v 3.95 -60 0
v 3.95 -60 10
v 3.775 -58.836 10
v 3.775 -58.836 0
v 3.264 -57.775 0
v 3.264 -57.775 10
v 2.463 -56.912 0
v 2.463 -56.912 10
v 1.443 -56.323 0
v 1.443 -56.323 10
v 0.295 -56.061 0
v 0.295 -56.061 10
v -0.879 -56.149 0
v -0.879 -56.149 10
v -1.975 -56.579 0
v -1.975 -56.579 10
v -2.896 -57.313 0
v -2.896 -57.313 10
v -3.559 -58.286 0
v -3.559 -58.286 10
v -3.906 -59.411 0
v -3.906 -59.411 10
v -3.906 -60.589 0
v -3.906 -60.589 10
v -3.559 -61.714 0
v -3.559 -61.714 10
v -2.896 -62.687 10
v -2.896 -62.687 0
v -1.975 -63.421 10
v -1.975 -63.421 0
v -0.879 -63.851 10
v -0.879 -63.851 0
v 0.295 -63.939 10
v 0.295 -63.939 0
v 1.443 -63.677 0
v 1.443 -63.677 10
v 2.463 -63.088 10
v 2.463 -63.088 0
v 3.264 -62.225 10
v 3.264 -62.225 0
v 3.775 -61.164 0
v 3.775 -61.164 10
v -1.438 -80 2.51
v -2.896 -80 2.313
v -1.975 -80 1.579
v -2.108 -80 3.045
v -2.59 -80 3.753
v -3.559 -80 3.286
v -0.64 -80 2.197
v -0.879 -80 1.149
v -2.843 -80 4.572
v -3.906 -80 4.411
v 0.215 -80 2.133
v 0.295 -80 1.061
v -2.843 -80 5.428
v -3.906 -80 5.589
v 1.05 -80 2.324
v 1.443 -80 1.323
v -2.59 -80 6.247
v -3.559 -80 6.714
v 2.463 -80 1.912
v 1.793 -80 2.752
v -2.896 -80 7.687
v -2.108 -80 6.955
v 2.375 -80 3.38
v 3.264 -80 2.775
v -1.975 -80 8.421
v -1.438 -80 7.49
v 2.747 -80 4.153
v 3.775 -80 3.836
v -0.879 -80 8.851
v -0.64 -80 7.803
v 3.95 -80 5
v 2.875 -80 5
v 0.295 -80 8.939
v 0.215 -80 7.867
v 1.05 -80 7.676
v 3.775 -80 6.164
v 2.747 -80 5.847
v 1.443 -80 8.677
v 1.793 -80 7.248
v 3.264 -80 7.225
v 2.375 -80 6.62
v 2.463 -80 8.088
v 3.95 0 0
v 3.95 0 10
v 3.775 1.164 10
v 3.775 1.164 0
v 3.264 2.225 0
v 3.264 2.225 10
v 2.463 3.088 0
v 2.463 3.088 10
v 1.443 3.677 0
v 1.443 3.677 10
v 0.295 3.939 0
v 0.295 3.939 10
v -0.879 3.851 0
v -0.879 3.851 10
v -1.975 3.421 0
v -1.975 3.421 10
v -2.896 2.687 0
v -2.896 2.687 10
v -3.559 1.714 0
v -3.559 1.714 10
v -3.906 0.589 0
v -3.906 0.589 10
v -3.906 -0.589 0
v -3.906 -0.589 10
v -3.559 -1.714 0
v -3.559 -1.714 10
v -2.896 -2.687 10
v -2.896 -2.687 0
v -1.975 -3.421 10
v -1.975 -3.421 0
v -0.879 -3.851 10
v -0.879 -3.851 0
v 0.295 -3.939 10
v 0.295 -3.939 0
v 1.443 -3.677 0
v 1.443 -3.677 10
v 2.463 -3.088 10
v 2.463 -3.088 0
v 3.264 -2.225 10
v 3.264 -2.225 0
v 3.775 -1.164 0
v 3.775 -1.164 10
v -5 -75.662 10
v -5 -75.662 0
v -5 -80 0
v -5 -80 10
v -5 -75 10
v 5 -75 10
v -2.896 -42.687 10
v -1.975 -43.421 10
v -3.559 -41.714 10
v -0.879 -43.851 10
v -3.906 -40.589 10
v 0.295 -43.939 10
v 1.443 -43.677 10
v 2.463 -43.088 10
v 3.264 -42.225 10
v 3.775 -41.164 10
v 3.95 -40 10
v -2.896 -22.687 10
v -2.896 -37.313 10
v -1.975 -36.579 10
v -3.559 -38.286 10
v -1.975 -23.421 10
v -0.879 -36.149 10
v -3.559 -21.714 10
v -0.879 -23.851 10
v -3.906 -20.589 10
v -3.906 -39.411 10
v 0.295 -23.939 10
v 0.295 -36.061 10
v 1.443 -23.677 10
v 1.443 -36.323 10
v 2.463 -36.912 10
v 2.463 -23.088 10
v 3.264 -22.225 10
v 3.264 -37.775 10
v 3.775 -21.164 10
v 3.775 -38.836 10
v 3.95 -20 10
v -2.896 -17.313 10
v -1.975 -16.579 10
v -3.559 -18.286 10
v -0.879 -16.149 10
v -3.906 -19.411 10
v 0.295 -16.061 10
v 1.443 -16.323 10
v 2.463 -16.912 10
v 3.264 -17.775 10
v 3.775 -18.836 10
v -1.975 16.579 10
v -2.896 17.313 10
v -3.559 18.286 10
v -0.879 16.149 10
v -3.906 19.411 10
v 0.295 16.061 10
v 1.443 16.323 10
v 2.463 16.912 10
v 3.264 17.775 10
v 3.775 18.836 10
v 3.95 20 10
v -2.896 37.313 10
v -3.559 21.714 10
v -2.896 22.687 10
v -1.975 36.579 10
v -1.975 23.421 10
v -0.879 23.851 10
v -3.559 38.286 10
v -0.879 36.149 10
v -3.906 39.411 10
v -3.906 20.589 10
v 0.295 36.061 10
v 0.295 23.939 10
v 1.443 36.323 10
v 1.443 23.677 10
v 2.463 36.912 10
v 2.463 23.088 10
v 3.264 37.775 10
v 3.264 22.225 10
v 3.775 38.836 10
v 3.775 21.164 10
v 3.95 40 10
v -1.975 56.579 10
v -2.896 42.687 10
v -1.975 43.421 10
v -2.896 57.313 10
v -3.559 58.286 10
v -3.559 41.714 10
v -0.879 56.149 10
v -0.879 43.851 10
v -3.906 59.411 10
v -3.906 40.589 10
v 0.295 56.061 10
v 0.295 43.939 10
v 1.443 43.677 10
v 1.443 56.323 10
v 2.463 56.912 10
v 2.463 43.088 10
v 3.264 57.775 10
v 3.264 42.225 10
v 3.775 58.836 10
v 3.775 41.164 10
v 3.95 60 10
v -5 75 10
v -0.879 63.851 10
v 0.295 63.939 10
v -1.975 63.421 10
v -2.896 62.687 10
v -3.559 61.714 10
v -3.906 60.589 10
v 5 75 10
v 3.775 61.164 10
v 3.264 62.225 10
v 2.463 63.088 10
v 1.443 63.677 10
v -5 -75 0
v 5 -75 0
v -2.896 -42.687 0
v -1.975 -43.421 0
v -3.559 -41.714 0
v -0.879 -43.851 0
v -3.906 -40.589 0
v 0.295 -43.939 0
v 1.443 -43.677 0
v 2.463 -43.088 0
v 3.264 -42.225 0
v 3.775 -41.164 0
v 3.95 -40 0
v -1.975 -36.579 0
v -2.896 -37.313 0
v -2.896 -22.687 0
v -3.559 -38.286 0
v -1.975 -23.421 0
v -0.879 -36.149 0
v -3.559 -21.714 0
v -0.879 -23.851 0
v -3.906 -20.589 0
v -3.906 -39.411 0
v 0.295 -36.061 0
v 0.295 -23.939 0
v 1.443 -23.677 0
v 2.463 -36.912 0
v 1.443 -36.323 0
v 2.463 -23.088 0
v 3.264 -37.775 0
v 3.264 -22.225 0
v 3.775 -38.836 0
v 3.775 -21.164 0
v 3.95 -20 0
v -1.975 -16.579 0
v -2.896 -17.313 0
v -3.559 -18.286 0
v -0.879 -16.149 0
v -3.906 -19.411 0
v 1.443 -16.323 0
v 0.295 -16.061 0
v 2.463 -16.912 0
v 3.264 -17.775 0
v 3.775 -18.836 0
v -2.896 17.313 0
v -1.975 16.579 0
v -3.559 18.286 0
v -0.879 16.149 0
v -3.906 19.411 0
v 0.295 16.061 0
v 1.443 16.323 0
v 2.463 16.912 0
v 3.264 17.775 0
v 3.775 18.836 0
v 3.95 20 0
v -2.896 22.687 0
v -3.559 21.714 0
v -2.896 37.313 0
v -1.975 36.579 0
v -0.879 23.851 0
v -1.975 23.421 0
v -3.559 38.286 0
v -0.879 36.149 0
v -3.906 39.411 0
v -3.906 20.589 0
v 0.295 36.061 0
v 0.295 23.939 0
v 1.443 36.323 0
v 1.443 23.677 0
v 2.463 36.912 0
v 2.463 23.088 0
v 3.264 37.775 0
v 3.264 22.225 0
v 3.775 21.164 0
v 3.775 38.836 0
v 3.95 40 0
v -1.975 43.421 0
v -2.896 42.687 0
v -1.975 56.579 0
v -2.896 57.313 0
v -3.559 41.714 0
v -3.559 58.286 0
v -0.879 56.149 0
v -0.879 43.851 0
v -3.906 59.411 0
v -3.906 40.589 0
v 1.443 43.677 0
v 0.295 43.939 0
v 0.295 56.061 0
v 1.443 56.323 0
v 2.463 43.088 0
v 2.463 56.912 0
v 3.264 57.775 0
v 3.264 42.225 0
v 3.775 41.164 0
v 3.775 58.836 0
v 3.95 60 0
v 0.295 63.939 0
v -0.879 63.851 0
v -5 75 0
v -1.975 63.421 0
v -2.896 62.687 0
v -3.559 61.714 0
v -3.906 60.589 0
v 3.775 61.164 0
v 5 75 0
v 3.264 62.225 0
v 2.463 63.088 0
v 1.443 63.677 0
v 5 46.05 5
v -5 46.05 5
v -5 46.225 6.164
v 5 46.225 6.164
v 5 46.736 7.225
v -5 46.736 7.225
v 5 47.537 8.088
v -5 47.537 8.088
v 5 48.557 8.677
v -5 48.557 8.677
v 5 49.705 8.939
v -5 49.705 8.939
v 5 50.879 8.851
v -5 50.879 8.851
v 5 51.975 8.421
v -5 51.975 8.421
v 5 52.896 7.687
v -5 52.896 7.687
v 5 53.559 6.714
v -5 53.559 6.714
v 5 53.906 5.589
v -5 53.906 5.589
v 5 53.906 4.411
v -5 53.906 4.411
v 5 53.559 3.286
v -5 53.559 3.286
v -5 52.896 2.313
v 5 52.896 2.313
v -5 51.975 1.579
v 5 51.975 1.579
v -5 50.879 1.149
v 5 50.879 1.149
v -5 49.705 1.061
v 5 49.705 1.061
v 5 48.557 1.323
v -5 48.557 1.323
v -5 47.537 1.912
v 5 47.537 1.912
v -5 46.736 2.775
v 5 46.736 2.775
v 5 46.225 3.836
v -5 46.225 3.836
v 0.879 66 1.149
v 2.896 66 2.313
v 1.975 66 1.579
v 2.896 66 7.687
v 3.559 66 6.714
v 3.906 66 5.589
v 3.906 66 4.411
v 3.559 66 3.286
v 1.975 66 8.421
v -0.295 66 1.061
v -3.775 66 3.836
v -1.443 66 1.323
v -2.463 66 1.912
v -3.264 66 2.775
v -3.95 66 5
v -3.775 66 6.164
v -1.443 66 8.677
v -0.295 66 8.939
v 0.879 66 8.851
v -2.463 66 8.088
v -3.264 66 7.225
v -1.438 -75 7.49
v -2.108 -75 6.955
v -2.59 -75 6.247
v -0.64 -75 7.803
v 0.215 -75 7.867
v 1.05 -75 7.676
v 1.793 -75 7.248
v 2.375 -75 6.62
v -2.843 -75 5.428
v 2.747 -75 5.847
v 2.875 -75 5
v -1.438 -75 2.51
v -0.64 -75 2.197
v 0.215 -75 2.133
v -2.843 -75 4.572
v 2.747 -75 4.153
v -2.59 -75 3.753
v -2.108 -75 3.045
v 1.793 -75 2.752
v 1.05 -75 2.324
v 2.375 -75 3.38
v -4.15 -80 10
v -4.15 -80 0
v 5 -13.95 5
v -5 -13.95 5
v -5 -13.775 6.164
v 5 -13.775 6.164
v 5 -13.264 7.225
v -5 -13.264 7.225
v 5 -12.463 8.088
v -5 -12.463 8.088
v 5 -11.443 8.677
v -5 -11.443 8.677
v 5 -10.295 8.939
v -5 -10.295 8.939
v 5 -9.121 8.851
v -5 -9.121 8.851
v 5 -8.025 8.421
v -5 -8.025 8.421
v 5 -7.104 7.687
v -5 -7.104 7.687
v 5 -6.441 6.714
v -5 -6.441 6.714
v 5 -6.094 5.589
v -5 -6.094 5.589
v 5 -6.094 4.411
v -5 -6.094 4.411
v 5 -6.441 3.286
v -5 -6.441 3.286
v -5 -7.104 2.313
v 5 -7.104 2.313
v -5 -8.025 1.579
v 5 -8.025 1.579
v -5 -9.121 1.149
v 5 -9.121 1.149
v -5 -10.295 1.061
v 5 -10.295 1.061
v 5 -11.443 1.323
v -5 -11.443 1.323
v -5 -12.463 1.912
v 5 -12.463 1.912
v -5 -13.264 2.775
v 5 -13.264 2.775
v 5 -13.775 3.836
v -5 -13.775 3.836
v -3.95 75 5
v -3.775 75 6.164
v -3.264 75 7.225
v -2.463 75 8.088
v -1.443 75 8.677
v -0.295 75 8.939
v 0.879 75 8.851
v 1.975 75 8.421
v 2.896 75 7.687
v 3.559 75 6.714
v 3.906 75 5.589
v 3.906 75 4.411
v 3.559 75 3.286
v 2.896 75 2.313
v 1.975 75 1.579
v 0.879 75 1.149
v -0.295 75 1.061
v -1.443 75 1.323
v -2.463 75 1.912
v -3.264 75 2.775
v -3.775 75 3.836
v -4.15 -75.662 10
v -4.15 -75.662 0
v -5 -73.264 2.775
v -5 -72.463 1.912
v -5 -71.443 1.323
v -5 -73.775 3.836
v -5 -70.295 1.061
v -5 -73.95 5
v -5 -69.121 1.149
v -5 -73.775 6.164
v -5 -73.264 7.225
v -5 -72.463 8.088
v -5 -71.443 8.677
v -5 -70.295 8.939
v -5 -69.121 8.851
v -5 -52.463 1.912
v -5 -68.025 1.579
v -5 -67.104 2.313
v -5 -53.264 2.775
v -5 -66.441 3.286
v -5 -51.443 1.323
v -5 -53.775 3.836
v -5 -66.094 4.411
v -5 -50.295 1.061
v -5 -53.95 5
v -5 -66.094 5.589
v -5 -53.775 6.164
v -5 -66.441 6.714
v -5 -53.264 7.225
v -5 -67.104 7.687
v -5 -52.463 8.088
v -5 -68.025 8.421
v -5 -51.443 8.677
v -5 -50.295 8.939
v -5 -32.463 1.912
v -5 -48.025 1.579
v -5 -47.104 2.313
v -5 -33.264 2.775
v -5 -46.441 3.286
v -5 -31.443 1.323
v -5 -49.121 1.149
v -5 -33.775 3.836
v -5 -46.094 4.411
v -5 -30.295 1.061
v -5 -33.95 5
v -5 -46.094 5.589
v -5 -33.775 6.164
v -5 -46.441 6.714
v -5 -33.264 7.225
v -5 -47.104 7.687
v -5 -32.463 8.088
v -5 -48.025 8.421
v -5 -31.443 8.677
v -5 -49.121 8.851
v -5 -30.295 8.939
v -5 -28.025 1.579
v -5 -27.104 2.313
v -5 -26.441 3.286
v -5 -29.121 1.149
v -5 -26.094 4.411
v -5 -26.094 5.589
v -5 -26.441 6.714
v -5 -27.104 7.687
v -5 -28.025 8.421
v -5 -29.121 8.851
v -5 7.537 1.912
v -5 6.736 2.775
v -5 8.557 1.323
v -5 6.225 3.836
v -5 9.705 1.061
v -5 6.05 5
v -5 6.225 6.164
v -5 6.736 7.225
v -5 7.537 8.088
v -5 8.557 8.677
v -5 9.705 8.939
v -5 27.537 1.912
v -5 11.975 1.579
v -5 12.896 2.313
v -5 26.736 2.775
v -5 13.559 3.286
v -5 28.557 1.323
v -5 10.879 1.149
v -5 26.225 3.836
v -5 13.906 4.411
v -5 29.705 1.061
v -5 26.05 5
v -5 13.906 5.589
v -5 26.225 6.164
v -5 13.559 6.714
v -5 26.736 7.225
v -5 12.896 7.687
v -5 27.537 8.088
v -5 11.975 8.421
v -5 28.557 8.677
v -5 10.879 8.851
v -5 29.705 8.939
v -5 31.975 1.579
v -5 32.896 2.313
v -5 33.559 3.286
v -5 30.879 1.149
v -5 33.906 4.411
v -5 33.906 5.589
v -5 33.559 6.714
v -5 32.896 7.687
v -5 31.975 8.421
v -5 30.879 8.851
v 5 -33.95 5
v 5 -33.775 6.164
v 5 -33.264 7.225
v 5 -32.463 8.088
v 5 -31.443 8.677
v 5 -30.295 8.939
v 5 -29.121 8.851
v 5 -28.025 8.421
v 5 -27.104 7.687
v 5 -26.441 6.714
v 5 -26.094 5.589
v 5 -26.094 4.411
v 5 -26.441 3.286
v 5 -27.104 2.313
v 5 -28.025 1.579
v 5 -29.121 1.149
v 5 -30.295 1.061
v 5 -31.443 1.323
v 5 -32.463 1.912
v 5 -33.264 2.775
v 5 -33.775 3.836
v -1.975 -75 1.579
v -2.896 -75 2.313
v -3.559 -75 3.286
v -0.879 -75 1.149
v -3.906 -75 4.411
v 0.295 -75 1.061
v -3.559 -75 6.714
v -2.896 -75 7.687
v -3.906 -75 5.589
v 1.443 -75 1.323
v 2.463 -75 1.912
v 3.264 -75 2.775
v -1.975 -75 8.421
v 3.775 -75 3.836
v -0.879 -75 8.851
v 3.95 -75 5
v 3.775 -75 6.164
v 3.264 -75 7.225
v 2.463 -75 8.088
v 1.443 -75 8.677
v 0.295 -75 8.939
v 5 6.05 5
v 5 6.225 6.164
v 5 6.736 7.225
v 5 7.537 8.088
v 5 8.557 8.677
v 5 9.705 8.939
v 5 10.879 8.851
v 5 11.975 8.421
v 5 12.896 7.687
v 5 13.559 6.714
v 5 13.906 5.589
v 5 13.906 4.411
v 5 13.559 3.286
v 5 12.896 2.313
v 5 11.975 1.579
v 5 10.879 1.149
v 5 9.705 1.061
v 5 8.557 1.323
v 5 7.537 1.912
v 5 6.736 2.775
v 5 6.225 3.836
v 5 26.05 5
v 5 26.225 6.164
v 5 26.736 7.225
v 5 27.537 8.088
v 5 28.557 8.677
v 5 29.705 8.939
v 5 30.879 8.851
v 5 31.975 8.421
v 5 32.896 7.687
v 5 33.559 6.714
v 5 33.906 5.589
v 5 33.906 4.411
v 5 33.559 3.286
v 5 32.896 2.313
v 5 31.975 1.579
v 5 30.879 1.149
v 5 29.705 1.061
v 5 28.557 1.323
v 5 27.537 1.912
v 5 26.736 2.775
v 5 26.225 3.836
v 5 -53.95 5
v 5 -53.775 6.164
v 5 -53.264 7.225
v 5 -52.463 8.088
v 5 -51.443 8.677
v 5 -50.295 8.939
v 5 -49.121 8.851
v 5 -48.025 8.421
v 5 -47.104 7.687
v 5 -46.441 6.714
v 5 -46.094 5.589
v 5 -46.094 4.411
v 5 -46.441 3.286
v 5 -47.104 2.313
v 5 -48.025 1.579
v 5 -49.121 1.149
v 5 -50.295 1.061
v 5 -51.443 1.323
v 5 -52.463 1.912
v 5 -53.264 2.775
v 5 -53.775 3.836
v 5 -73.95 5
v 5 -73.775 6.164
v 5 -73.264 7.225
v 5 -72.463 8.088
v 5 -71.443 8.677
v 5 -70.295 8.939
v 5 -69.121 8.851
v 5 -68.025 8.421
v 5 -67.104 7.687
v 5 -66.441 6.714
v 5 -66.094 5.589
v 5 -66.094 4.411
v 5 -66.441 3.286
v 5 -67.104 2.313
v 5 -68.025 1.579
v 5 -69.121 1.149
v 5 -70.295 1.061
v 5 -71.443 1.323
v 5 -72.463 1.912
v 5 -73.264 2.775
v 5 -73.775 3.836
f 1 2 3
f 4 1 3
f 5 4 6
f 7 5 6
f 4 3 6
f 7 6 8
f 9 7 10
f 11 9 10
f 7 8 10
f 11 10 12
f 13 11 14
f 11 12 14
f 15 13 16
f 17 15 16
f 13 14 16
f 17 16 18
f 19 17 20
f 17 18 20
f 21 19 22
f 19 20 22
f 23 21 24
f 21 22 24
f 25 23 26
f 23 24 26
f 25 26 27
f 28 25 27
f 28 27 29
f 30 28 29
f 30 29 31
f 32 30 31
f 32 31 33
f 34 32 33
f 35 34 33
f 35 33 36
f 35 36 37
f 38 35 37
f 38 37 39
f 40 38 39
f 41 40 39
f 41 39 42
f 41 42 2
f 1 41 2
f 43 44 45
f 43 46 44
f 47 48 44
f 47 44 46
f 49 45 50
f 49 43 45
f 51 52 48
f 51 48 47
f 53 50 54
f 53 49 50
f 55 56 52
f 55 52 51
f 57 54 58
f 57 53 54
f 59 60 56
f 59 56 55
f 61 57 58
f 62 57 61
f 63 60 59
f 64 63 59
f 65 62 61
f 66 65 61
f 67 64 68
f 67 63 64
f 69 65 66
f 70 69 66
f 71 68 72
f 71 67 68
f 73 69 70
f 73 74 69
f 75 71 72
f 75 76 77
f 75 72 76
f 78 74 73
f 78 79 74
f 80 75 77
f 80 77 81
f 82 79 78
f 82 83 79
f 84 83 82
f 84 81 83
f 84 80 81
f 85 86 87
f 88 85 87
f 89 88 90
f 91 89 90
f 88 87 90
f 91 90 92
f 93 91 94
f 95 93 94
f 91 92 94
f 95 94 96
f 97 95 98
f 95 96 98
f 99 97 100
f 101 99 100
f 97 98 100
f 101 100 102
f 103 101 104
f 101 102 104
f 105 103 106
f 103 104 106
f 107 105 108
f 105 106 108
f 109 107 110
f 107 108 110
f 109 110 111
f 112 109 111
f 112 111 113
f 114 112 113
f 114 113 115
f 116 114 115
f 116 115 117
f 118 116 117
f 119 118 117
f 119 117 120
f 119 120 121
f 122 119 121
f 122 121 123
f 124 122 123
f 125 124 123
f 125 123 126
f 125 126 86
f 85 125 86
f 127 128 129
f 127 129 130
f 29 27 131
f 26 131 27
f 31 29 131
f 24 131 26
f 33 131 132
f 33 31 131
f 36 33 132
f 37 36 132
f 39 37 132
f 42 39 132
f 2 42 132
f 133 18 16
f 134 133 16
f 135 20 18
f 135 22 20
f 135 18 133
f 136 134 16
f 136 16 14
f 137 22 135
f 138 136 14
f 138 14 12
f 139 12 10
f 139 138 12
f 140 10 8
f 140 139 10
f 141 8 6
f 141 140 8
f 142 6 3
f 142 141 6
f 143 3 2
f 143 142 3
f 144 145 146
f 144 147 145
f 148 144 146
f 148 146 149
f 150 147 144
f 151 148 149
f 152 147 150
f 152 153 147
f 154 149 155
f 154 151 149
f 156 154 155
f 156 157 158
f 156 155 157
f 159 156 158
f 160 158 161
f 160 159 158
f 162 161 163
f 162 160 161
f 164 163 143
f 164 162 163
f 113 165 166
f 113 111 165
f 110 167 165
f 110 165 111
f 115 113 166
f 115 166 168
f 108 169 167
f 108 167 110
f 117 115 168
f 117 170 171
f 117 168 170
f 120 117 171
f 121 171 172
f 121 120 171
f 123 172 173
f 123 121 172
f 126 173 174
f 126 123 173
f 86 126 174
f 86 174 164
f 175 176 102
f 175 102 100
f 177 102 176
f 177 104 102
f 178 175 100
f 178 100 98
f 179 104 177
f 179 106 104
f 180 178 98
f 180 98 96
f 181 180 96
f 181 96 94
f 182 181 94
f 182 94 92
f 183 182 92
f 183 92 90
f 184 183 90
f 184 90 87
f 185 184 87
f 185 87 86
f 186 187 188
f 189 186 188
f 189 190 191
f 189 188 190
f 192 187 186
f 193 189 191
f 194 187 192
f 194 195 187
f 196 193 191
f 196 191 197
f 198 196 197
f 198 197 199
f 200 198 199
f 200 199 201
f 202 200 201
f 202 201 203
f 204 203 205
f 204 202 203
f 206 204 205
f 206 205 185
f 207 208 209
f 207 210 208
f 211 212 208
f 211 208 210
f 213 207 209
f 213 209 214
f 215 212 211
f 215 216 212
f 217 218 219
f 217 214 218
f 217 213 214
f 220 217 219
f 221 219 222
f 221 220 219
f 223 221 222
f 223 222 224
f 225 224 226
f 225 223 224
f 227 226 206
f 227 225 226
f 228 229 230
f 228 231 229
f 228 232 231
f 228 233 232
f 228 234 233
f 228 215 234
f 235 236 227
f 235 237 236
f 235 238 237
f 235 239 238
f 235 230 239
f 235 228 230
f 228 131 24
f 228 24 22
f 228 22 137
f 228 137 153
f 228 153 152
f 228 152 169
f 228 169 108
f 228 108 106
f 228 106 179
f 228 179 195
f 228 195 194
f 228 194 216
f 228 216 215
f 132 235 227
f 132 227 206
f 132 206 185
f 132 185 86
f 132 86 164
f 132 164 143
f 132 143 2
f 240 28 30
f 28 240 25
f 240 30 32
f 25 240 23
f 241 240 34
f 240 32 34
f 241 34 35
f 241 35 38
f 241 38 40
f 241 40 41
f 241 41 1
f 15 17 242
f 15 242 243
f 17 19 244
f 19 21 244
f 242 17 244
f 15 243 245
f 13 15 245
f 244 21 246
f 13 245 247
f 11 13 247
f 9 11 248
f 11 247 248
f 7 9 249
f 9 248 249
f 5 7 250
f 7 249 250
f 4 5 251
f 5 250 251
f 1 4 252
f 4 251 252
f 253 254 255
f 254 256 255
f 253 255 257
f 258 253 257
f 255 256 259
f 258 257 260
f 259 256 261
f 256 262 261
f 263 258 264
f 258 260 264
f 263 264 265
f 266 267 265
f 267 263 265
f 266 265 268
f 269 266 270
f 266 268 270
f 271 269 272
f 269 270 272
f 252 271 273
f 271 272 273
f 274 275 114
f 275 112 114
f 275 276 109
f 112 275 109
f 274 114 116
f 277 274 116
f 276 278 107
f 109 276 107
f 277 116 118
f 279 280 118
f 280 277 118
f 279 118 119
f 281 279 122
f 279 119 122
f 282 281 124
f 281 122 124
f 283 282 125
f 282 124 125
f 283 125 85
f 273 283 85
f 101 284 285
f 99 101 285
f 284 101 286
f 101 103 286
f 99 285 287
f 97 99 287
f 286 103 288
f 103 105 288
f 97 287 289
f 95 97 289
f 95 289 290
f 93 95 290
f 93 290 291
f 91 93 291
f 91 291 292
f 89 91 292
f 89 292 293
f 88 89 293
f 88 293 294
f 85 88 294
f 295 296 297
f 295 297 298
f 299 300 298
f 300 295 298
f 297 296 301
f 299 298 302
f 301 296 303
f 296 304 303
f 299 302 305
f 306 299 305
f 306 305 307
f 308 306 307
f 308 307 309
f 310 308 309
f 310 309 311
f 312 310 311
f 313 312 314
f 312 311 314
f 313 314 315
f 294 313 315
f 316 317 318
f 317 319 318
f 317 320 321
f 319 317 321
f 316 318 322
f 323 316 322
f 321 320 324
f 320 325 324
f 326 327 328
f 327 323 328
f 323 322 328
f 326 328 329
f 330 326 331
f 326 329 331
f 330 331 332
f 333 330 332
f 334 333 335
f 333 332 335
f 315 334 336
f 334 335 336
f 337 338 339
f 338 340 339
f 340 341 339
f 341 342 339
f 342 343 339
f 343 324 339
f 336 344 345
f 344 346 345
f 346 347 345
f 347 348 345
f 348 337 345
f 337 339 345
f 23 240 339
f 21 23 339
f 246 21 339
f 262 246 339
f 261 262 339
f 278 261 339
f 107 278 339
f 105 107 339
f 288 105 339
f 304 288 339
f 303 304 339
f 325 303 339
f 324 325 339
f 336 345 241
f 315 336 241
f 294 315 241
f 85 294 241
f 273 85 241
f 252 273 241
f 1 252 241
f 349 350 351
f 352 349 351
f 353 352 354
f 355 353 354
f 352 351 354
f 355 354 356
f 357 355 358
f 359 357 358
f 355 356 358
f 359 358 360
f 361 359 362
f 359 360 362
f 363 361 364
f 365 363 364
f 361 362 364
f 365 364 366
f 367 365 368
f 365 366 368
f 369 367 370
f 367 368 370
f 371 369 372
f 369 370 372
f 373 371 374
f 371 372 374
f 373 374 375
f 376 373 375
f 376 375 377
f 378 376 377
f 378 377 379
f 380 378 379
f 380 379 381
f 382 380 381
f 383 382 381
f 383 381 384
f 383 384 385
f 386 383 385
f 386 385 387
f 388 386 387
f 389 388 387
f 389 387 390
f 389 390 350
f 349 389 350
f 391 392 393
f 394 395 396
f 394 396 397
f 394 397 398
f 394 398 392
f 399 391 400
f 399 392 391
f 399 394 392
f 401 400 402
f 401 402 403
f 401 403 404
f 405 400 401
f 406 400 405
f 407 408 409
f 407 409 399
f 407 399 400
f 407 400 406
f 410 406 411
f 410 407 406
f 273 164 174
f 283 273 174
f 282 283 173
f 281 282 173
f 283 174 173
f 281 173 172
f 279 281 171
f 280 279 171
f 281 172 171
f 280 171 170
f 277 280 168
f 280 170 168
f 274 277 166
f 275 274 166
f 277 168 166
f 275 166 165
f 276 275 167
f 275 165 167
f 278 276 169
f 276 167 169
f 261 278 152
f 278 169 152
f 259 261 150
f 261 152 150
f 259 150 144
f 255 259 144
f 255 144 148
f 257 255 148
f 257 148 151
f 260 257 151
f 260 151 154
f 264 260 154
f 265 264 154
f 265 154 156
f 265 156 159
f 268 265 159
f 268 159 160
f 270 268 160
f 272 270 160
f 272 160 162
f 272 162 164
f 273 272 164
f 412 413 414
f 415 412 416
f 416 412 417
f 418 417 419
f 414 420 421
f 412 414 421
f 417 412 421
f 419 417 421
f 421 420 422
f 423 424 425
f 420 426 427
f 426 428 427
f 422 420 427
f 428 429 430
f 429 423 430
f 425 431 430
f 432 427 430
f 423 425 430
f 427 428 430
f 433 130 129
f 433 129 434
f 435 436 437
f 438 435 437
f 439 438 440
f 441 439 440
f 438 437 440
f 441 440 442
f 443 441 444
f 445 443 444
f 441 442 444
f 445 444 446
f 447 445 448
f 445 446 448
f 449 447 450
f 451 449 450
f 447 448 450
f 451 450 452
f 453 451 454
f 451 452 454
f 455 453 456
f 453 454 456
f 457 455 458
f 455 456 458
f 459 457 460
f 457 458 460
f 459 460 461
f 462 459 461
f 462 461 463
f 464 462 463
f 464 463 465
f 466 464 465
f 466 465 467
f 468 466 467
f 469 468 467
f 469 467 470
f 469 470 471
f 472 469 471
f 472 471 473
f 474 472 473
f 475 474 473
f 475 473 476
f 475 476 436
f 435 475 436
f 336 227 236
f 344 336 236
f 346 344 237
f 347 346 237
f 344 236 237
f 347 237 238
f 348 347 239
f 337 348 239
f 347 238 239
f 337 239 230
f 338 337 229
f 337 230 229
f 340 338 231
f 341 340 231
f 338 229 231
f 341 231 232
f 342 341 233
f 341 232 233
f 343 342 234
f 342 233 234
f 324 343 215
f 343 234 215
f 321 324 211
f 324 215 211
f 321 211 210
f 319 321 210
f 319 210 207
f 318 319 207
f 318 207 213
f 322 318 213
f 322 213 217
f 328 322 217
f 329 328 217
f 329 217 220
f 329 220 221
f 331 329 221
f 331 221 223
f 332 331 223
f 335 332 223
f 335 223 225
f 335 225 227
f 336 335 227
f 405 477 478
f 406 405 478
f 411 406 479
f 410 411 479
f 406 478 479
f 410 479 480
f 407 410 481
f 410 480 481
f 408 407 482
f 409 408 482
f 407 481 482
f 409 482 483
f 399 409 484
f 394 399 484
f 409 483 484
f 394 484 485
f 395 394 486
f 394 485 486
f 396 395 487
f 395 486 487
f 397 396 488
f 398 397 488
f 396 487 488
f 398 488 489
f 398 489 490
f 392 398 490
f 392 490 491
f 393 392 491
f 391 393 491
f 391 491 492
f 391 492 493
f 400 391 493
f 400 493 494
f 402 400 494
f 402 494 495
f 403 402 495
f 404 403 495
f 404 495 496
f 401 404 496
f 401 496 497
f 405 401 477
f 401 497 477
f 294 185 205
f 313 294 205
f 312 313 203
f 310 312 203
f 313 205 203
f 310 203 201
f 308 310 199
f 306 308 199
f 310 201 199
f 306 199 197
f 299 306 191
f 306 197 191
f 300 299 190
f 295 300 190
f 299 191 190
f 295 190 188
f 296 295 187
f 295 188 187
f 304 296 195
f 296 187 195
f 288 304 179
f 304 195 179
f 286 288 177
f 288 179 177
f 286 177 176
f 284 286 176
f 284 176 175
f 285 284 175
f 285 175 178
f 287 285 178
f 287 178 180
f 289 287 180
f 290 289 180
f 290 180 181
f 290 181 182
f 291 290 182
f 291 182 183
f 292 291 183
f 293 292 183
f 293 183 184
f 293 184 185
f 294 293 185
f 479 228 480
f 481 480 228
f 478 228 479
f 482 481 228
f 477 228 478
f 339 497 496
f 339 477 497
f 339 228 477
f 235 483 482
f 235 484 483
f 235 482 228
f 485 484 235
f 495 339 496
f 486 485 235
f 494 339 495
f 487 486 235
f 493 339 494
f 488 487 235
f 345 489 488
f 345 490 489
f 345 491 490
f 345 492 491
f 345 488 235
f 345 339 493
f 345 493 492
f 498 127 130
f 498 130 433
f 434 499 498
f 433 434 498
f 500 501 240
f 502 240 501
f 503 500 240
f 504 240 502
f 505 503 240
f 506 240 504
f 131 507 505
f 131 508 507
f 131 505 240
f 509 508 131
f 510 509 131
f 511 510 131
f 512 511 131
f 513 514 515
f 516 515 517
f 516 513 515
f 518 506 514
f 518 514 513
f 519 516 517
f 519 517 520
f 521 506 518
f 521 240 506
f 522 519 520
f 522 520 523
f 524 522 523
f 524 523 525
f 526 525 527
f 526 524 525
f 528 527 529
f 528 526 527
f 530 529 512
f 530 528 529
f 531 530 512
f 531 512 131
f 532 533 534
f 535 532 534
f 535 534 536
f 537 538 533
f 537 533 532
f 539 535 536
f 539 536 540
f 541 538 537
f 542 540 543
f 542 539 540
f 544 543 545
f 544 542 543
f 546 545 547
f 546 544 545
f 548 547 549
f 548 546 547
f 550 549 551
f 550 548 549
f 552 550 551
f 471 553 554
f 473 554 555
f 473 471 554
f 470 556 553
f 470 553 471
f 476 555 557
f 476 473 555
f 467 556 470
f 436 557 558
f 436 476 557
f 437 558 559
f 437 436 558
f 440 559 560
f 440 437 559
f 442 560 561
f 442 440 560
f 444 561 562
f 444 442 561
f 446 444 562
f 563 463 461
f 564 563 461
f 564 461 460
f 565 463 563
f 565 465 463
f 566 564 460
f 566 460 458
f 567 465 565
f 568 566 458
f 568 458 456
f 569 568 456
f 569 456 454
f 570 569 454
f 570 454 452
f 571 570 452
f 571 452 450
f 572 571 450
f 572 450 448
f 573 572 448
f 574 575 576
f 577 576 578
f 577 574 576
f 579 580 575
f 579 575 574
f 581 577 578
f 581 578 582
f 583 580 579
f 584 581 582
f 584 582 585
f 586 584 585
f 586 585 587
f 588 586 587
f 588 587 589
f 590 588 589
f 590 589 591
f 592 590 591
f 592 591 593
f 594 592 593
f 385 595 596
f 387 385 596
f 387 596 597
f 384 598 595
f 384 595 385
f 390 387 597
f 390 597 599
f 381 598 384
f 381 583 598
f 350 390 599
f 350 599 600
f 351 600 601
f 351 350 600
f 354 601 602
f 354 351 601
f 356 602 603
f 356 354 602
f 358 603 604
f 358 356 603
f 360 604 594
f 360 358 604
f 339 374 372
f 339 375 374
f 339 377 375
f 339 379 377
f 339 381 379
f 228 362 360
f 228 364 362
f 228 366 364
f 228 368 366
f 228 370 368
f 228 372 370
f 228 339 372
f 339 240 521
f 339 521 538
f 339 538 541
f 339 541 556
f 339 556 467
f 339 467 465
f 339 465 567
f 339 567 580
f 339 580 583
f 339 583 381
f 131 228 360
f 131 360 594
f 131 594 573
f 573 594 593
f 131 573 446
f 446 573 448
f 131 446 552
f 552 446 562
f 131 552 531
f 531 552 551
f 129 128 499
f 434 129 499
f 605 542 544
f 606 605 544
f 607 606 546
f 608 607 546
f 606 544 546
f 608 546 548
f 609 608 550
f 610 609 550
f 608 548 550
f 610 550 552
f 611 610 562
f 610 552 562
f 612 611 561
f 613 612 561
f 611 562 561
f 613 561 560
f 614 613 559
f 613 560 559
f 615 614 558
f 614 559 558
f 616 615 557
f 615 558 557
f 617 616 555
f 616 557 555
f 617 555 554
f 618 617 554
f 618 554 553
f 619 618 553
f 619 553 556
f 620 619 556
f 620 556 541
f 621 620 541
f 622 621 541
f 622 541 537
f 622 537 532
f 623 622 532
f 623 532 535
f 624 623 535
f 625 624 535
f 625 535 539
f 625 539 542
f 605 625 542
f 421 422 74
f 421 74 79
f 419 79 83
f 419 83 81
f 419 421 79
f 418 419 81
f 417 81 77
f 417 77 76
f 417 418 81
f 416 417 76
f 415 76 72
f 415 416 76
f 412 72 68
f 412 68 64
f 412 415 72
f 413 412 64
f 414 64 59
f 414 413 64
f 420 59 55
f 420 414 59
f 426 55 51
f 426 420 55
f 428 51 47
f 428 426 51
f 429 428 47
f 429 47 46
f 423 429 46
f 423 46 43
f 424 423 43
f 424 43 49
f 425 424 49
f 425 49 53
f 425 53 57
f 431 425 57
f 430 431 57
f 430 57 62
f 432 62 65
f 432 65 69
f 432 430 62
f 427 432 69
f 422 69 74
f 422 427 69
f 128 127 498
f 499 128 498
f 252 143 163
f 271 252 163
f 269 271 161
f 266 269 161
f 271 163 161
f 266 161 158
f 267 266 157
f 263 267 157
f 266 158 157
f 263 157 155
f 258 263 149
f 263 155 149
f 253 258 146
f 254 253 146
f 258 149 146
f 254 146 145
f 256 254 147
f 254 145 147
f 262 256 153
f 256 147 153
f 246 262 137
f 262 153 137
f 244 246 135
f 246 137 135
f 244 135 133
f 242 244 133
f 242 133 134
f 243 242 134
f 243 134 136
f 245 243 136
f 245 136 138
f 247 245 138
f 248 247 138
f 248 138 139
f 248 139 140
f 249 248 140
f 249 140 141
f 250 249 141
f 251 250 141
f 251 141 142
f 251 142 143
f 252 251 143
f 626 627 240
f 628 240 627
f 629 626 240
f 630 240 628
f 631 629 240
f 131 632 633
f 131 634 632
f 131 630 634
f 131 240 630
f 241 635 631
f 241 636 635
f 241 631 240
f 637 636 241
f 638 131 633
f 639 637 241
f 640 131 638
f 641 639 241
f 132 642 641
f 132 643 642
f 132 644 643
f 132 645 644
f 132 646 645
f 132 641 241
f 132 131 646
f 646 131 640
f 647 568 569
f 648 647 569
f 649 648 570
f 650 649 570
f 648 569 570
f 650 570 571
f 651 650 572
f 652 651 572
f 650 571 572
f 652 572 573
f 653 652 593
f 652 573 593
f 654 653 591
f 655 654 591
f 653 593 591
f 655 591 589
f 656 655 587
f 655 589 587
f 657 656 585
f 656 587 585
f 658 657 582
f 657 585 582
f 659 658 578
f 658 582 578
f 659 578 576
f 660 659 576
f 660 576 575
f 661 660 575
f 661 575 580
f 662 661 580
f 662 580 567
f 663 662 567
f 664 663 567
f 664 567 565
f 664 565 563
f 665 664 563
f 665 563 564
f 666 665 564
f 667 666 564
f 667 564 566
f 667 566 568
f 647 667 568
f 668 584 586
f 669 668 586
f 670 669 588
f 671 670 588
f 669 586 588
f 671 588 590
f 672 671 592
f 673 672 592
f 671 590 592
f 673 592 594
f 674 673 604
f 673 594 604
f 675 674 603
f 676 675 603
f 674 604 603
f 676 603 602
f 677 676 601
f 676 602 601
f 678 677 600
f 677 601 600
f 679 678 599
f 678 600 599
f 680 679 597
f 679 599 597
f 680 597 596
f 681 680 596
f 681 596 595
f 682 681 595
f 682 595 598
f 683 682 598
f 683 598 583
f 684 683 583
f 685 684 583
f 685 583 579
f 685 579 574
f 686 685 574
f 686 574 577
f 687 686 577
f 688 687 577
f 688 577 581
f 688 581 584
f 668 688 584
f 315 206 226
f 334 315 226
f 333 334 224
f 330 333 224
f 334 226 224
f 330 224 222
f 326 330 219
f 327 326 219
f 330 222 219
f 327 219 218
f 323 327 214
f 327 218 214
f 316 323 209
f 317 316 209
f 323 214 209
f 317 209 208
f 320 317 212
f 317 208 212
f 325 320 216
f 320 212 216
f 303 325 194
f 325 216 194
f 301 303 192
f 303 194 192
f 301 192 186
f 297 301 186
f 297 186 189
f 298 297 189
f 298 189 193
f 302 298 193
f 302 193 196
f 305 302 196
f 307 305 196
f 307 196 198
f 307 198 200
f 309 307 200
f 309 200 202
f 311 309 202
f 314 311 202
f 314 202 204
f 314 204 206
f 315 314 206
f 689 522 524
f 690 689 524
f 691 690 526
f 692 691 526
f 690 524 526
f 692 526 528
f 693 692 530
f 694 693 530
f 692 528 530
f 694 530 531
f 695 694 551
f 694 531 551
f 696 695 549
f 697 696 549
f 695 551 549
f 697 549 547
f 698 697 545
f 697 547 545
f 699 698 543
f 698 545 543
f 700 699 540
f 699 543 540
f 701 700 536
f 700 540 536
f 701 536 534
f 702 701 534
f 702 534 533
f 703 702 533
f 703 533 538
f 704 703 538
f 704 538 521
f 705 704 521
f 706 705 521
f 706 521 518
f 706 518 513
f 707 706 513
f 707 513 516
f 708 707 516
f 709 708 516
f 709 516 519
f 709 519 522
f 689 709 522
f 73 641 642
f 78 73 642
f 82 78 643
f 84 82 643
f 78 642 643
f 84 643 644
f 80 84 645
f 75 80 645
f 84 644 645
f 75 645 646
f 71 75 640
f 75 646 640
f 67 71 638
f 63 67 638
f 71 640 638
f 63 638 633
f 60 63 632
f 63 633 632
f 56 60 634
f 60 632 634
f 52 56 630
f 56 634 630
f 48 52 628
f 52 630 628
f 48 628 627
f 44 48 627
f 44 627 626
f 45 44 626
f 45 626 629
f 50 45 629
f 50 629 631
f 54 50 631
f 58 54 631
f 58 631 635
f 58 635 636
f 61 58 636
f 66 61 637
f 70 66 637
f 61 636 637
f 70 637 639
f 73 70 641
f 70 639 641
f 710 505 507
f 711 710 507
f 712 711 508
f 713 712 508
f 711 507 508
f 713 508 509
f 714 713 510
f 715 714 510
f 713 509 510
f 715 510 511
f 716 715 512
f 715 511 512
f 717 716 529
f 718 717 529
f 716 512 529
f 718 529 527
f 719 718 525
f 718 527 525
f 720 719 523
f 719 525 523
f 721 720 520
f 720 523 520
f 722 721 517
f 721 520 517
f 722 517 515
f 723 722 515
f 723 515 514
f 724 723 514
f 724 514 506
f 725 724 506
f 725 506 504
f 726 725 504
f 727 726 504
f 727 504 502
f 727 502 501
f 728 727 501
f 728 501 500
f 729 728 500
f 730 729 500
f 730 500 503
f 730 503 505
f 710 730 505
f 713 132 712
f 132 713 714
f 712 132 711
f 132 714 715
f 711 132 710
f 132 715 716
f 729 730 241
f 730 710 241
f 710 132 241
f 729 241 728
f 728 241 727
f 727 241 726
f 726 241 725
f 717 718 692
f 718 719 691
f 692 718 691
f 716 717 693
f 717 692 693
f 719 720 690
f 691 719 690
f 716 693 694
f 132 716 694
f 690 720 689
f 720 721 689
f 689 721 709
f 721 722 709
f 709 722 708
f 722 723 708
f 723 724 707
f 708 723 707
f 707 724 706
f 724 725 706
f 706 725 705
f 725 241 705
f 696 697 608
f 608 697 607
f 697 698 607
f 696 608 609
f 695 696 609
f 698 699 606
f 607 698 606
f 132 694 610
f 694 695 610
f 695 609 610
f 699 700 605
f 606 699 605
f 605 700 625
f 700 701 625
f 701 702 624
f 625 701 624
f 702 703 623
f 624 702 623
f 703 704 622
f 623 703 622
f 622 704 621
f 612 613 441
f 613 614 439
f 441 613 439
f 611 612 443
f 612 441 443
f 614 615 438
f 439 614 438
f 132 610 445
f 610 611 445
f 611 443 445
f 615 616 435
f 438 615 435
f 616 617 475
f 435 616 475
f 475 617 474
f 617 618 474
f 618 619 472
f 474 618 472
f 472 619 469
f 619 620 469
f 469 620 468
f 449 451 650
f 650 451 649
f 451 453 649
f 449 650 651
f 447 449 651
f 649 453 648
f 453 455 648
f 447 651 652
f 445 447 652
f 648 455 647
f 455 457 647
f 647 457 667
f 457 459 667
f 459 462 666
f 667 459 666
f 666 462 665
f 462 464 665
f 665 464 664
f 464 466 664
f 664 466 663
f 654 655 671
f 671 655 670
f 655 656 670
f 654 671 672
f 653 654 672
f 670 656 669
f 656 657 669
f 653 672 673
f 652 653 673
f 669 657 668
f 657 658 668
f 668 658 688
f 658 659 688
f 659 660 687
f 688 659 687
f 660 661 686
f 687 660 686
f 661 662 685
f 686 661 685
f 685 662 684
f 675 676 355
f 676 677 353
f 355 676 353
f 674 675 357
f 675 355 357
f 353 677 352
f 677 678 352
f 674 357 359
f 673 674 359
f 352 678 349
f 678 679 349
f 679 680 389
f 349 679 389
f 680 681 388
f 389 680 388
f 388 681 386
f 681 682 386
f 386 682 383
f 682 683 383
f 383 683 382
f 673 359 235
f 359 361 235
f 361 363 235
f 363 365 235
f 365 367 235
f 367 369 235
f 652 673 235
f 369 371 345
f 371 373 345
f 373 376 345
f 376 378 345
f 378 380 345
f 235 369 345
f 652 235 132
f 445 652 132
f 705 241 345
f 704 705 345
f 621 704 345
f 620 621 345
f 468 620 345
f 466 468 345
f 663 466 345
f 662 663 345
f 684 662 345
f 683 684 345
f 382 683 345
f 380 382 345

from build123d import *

# Parameters (mm, degrees)
F0_W      = 10
F0_H      = 150
F1_DEPTH  = 10
F2_R      = 3.95
F3_DEPTH  = 25
F4_R      = 3.95
F5_DEPTH  = 25
F6_R      = 3.95
F7_DEPTH  = 9
F8_R      = 3.95
F8_R_2    = 2.875
F9_DEPTH  = 5
F10_W     = 0.85
F10_H     = 10
F11_DEPTH = 5
F12_W     = 2.29301
F12_H     = 0.662494
F13_DEPTH = 25


with BuildPart() as f1:
    # F0 (on Top) → F1 (new body)
    with BuildSketch(Plane.XY):
        Rectangle(F0_W, F0_H)
    extrude(amount=F1_DEPTH)

    # F2 (on face) → F3 (cut)
    with BuildSketch(Plane.XY.offset(10)):
        Circle(F2_R)
        with Locations((0, 20)):
            Circle(F2_R)
        with Locations((0, 40)):
            Circle(F2_R)
        with Locations((0, 60)):
            Circle(F2_R)
        with Locations((0, -20)):
            Circle(F2_R)
        with Locations((0, -40)):
            Circle(F2_R)
        with Locations((0, -60)):
            Circle(F2_R)
    extrude(amount=-F3_DEPTH, mode=Mode.SUBTRACT)

    # F4 (on face) → F5 (cut)
    with BuildSketch(Plane(origin=(-5, 0, 0), x_dir=(0, -1, 0), z_dir=(-1, 0, 0))):
        with Locations((-10, 5)):
            Circle(F4_R)
        with Locations((-30, 5)):
            Circle(F4_R)
        with Locations((-50, 5)):
            Circle(F4_R)
        with Locations((10, 5)):
            Circle(F4_R)
        with Locations((30, 5)):
            Circle(F4_R)
        with Locations((50, 5)):
            Circle(F4_R)
        with Locations((70, 5)):
            Circle(F4_R)
    extrude(amount=-F5_DEPTH, mode=Mode.SUBTRACT)

    # F6 (on face) → F7 (cut)
    with BuildSketch(Plane(origin=(0, 75, 0), x_dir=(-1, 0, 0), z_dir=(0, 1, 0))):
        with Locations((0, 5)):
            Circle(F6_R)
    extrude(amount=-F7_DEPTH, mode=Mode.SUBTRACT)

    # F8 (on face) → F9 (join)
    with BuildSketch(Plane.XZ.offset(75)):
        with Locations((0, 5)):
            Circle(F8_R)
        with Locations((0, 5)):
            Circle(F8_R_2, mode=Mode.SUBTRACT)
    extrude(amount=F9_DEPTH)

    # F10 (on face) → F11 (join)
    with BuildSketch(Plane.XZ.offset(75)):
        with Locations((-4.575, 5)):
            Rectangle(F10_W, F10_H)
    extrude(amount=F11_DEPTH)

    # F12 (on face) → F13 (cut)
    with BuildSketch(Plane.XY.offset(10)):
        with Locations((-5.296505, -75.331247)):
            Rectangle(F12_W, F12_H)
    extrude(amount=-F13_DEPTH, mode=Mode.SUBTRACT)


solid = f1.part
